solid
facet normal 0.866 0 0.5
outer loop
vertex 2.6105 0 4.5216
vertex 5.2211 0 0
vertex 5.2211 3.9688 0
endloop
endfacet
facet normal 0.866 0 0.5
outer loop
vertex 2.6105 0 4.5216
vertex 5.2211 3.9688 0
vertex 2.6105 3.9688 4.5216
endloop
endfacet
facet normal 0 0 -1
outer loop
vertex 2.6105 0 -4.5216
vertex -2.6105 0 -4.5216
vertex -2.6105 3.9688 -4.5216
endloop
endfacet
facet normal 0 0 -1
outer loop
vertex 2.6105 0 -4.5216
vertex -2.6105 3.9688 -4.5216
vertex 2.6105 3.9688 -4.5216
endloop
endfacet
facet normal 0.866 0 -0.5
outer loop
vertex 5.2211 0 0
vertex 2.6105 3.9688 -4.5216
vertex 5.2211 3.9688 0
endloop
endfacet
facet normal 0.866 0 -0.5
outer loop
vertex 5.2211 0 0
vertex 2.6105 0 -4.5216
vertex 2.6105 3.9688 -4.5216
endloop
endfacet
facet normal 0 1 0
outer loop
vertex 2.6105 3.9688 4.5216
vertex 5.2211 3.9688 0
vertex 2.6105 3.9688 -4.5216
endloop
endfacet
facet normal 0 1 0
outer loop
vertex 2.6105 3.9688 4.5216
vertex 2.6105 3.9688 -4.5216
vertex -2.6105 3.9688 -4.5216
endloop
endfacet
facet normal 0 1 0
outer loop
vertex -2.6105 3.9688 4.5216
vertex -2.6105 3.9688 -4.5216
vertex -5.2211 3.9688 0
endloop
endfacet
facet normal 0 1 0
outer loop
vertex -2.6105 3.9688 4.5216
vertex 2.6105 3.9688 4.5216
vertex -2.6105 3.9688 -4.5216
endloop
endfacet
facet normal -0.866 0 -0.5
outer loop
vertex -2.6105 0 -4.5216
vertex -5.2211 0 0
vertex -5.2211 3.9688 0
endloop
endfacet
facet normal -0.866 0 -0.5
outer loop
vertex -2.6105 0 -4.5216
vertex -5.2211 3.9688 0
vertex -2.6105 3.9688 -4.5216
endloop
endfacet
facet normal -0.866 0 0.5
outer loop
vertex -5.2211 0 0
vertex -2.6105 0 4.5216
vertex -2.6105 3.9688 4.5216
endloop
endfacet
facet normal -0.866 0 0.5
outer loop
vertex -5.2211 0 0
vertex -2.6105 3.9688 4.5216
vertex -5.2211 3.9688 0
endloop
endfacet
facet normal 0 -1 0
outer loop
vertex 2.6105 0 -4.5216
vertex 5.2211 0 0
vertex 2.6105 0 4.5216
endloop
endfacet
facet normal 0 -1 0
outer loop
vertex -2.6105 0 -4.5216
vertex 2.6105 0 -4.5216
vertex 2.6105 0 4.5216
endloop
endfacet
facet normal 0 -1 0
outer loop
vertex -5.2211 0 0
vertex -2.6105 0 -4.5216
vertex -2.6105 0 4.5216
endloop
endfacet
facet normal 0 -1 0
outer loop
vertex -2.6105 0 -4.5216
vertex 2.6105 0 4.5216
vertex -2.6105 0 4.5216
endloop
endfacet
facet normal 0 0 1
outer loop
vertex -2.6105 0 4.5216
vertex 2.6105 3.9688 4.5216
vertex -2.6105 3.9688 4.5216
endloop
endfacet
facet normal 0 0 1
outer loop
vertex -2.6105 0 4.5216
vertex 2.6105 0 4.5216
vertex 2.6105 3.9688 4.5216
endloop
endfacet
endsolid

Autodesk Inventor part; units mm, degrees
ref_plane "YZ Plane" through (0, 0, 0) normal (1, 0, 0) x (0, 1, 0)
ref_plane "XZ Plane" through (0, 0, 0) normal (0, 1, 0) x (-1, 0, 0)
ref_plane "XY Plane" through (0, 0, 0) normal (0, 0, 1) x (1, 0, 0)
sketch "Sketch1" plane through (0, 0, 0) normal (0, 1, 0) x (-1, 0, 0)
  line L0 (-9.9441, 7.0739) -> (9.9441, 7.0739)
  line L1 (9.9441, 7.0739) -> (9.9441, -7.0739)
  line L2 (9.9441, -7.0739) -> (-9.9441, -7.0739)
  line L3 (-9.9441, -7.0739) -> (-9.9441, 7.0739)
  line L4 (-9.9441, 7.0739) -> (9.9441, -7.0739) construction
  line L5 (9.9441, 7.0739) -> (-9.9441, -7.0739) construction
  line L6 (5.2211, 0) -> (2.6105, -4.5216)
  line L7 (2.6105, -4.5216) -> (-2.6105, -4.5216)
  line L8 (-2.6105, -4.5216) -> (-5.2211, 0)
  line L9 (-5.2211, 0) -> (-2.6105, 4.5216)
  line L10 (-2.6105, 4.5216) -> (2.6105, 4.5216)
  line L11 (2.6105, 4.5216) -> (5.2211, 0)
  point P0 (0, 0)
  point P1 (0, 0)
  dimension "d0" = 19.8882
  dimension "d1" = 14.1478
extrude "Extrusion1" add sketch "Sketch1" along normal blind 3.9688 contours L6 L7 L8 L9 L10 L11
properties part number "Wheel side stand nut"
